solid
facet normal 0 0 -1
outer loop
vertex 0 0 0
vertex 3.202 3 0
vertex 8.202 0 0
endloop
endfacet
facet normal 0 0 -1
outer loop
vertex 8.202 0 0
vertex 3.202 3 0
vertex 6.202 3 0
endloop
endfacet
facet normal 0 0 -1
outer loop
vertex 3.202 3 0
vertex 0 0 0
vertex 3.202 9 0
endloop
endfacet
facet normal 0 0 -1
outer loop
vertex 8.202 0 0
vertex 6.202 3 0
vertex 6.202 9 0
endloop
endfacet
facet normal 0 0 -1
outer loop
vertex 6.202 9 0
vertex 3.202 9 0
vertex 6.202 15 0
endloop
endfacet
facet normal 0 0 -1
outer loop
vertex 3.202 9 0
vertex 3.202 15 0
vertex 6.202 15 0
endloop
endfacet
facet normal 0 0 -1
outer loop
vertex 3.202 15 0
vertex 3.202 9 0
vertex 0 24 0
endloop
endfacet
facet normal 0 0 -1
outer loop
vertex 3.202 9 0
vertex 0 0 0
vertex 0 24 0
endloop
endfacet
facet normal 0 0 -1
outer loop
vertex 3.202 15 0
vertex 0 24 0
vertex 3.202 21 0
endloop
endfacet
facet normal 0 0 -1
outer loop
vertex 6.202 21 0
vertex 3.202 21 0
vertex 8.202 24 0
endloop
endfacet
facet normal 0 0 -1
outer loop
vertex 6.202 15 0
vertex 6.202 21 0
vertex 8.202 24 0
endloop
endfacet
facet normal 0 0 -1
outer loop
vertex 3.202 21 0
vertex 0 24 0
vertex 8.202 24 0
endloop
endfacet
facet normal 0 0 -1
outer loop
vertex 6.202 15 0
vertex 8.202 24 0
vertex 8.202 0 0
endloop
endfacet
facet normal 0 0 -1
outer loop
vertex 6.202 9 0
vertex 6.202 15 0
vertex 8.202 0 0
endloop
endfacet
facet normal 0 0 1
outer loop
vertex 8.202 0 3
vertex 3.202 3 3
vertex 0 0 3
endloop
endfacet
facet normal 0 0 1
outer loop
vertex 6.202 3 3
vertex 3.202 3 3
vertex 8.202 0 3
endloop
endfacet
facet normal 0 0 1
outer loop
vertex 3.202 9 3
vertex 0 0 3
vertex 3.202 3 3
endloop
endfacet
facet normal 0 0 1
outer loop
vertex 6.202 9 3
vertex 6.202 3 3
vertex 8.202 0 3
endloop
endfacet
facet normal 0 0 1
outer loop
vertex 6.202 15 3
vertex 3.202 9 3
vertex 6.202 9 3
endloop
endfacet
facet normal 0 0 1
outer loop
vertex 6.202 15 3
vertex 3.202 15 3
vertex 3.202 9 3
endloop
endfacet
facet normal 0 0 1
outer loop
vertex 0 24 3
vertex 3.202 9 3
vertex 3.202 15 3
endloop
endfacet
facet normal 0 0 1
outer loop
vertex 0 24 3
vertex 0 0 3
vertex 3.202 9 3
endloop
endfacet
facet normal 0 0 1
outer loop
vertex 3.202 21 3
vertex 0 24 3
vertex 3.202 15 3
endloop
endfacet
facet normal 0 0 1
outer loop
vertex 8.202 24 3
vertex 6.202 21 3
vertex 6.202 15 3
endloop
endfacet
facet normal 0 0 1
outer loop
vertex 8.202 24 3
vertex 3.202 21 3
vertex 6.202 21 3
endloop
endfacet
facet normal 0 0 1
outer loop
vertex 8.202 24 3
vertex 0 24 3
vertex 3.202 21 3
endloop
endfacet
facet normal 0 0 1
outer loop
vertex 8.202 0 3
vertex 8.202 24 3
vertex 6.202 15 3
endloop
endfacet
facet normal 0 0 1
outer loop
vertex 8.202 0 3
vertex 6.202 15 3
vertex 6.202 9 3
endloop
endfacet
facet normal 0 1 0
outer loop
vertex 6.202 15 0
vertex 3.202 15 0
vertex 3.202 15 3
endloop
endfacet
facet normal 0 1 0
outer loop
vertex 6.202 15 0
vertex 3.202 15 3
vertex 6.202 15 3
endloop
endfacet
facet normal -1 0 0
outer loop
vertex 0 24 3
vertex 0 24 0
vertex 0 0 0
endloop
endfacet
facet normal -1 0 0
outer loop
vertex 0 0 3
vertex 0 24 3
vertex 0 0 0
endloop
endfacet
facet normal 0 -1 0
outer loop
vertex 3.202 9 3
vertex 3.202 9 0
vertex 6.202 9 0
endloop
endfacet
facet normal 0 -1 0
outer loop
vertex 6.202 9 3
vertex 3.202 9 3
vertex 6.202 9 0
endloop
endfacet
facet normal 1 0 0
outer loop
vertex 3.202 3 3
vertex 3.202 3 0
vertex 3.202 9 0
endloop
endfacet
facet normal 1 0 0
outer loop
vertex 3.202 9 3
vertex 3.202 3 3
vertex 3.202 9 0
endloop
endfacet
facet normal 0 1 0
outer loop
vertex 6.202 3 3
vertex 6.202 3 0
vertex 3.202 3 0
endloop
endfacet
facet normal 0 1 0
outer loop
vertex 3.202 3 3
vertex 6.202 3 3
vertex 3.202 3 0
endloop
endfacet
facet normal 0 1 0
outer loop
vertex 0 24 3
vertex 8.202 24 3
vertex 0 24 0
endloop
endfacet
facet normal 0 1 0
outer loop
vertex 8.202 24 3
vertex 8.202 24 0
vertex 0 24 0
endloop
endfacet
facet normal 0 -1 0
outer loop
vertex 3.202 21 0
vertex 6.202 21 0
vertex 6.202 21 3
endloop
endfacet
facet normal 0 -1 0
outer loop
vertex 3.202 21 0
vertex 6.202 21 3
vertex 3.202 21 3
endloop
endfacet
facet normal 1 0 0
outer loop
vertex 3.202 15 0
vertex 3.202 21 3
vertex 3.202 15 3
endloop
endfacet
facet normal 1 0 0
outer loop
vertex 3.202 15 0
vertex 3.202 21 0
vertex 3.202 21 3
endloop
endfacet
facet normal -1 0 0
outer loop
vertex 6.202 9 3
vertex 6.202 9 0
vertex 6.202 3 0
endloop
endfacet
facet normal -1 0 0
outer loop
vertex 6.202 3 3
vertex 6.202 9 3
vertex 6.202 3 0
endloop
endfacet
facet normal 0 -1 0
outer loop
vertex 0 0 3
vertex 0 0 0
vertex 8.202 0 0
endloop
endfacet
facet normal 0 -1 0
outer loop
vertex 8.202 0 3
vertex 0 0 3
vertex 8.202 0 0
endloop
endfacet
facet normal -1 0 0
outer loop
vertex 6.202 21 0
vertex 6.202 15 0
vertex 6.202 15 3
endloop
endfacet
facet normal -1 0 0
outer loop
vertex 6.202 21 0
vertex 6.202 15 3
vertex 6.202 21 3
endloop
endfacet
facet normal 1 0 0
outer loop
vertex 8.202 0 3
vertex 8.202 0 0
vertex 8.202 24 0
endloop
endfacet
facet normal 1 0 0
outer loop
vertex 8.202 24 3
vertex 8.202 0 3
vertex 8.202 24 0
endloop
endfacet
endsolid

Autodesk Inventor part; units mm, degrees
ref_plane "YZ Plane" through (0, 0, 0) normal (1, 0, 0) x (0, 1, 0)
ref_plane "XZ Plane" through (0, 0, 0) normal (0, 1, 0) x (-1, 0, 0)
ref_plane "XY Plane" through (0, 0, 0) normal (0, 0, 1) x (1, 0, 0)
sketch "Sketch1" plane through (0, 0, 0) normal (0, 0, 1) x (1, 0, 0)
  line L0 (0, 0) -> (8.2022, 0)
  line L1 (8.2022, 0) -> (8.2022, 24)
  line L2 (8.2022, 24) -> (0, 24)
  line L3 (0, 24) -> (0, 0)
  line L4 (6.2022, 21) -> (3.2022, 21)
  line L5 (3.2022, 21) -> (3.2022, 15)
  line L6 (3.2022, 15) -> (6.2022, 15)
  line L7 (6.2022, 15) -> (6.2022, 21)
  line L8 (10.1659, 12) -> (-5.2678, 12)
  line L9 (6.2022, 3) -> (3.2022, 3)
  line L10 (3.2022, 3) -> (3.2022, 9)
  line L11 (3.2022, 9) -> (6.2022, 9)
  line L12 (6.2022, 9) -> (6.2022, 3)
  dimension "d0" = 24
  dimension "d1" = 3
  dimension "d2" = 6
  dimension "d3" = 3
  dimension "d4" = 2
extrude "Extrusion1" add sketch "Sketch1" along normal blind 3
equation "\"d0\" = CameraHeight"
equation "\"d1\" = Acrylic"
equation "\"d2\" = 0.25 * CameraHeight"
equation "\"d5\" = Acrylic"
equation "\"Acrylic\" = 3"
equation "\"CameraHeight\" = 24"
equation "\"CameraWidth\" = 25"
properties part number "SideClip"
